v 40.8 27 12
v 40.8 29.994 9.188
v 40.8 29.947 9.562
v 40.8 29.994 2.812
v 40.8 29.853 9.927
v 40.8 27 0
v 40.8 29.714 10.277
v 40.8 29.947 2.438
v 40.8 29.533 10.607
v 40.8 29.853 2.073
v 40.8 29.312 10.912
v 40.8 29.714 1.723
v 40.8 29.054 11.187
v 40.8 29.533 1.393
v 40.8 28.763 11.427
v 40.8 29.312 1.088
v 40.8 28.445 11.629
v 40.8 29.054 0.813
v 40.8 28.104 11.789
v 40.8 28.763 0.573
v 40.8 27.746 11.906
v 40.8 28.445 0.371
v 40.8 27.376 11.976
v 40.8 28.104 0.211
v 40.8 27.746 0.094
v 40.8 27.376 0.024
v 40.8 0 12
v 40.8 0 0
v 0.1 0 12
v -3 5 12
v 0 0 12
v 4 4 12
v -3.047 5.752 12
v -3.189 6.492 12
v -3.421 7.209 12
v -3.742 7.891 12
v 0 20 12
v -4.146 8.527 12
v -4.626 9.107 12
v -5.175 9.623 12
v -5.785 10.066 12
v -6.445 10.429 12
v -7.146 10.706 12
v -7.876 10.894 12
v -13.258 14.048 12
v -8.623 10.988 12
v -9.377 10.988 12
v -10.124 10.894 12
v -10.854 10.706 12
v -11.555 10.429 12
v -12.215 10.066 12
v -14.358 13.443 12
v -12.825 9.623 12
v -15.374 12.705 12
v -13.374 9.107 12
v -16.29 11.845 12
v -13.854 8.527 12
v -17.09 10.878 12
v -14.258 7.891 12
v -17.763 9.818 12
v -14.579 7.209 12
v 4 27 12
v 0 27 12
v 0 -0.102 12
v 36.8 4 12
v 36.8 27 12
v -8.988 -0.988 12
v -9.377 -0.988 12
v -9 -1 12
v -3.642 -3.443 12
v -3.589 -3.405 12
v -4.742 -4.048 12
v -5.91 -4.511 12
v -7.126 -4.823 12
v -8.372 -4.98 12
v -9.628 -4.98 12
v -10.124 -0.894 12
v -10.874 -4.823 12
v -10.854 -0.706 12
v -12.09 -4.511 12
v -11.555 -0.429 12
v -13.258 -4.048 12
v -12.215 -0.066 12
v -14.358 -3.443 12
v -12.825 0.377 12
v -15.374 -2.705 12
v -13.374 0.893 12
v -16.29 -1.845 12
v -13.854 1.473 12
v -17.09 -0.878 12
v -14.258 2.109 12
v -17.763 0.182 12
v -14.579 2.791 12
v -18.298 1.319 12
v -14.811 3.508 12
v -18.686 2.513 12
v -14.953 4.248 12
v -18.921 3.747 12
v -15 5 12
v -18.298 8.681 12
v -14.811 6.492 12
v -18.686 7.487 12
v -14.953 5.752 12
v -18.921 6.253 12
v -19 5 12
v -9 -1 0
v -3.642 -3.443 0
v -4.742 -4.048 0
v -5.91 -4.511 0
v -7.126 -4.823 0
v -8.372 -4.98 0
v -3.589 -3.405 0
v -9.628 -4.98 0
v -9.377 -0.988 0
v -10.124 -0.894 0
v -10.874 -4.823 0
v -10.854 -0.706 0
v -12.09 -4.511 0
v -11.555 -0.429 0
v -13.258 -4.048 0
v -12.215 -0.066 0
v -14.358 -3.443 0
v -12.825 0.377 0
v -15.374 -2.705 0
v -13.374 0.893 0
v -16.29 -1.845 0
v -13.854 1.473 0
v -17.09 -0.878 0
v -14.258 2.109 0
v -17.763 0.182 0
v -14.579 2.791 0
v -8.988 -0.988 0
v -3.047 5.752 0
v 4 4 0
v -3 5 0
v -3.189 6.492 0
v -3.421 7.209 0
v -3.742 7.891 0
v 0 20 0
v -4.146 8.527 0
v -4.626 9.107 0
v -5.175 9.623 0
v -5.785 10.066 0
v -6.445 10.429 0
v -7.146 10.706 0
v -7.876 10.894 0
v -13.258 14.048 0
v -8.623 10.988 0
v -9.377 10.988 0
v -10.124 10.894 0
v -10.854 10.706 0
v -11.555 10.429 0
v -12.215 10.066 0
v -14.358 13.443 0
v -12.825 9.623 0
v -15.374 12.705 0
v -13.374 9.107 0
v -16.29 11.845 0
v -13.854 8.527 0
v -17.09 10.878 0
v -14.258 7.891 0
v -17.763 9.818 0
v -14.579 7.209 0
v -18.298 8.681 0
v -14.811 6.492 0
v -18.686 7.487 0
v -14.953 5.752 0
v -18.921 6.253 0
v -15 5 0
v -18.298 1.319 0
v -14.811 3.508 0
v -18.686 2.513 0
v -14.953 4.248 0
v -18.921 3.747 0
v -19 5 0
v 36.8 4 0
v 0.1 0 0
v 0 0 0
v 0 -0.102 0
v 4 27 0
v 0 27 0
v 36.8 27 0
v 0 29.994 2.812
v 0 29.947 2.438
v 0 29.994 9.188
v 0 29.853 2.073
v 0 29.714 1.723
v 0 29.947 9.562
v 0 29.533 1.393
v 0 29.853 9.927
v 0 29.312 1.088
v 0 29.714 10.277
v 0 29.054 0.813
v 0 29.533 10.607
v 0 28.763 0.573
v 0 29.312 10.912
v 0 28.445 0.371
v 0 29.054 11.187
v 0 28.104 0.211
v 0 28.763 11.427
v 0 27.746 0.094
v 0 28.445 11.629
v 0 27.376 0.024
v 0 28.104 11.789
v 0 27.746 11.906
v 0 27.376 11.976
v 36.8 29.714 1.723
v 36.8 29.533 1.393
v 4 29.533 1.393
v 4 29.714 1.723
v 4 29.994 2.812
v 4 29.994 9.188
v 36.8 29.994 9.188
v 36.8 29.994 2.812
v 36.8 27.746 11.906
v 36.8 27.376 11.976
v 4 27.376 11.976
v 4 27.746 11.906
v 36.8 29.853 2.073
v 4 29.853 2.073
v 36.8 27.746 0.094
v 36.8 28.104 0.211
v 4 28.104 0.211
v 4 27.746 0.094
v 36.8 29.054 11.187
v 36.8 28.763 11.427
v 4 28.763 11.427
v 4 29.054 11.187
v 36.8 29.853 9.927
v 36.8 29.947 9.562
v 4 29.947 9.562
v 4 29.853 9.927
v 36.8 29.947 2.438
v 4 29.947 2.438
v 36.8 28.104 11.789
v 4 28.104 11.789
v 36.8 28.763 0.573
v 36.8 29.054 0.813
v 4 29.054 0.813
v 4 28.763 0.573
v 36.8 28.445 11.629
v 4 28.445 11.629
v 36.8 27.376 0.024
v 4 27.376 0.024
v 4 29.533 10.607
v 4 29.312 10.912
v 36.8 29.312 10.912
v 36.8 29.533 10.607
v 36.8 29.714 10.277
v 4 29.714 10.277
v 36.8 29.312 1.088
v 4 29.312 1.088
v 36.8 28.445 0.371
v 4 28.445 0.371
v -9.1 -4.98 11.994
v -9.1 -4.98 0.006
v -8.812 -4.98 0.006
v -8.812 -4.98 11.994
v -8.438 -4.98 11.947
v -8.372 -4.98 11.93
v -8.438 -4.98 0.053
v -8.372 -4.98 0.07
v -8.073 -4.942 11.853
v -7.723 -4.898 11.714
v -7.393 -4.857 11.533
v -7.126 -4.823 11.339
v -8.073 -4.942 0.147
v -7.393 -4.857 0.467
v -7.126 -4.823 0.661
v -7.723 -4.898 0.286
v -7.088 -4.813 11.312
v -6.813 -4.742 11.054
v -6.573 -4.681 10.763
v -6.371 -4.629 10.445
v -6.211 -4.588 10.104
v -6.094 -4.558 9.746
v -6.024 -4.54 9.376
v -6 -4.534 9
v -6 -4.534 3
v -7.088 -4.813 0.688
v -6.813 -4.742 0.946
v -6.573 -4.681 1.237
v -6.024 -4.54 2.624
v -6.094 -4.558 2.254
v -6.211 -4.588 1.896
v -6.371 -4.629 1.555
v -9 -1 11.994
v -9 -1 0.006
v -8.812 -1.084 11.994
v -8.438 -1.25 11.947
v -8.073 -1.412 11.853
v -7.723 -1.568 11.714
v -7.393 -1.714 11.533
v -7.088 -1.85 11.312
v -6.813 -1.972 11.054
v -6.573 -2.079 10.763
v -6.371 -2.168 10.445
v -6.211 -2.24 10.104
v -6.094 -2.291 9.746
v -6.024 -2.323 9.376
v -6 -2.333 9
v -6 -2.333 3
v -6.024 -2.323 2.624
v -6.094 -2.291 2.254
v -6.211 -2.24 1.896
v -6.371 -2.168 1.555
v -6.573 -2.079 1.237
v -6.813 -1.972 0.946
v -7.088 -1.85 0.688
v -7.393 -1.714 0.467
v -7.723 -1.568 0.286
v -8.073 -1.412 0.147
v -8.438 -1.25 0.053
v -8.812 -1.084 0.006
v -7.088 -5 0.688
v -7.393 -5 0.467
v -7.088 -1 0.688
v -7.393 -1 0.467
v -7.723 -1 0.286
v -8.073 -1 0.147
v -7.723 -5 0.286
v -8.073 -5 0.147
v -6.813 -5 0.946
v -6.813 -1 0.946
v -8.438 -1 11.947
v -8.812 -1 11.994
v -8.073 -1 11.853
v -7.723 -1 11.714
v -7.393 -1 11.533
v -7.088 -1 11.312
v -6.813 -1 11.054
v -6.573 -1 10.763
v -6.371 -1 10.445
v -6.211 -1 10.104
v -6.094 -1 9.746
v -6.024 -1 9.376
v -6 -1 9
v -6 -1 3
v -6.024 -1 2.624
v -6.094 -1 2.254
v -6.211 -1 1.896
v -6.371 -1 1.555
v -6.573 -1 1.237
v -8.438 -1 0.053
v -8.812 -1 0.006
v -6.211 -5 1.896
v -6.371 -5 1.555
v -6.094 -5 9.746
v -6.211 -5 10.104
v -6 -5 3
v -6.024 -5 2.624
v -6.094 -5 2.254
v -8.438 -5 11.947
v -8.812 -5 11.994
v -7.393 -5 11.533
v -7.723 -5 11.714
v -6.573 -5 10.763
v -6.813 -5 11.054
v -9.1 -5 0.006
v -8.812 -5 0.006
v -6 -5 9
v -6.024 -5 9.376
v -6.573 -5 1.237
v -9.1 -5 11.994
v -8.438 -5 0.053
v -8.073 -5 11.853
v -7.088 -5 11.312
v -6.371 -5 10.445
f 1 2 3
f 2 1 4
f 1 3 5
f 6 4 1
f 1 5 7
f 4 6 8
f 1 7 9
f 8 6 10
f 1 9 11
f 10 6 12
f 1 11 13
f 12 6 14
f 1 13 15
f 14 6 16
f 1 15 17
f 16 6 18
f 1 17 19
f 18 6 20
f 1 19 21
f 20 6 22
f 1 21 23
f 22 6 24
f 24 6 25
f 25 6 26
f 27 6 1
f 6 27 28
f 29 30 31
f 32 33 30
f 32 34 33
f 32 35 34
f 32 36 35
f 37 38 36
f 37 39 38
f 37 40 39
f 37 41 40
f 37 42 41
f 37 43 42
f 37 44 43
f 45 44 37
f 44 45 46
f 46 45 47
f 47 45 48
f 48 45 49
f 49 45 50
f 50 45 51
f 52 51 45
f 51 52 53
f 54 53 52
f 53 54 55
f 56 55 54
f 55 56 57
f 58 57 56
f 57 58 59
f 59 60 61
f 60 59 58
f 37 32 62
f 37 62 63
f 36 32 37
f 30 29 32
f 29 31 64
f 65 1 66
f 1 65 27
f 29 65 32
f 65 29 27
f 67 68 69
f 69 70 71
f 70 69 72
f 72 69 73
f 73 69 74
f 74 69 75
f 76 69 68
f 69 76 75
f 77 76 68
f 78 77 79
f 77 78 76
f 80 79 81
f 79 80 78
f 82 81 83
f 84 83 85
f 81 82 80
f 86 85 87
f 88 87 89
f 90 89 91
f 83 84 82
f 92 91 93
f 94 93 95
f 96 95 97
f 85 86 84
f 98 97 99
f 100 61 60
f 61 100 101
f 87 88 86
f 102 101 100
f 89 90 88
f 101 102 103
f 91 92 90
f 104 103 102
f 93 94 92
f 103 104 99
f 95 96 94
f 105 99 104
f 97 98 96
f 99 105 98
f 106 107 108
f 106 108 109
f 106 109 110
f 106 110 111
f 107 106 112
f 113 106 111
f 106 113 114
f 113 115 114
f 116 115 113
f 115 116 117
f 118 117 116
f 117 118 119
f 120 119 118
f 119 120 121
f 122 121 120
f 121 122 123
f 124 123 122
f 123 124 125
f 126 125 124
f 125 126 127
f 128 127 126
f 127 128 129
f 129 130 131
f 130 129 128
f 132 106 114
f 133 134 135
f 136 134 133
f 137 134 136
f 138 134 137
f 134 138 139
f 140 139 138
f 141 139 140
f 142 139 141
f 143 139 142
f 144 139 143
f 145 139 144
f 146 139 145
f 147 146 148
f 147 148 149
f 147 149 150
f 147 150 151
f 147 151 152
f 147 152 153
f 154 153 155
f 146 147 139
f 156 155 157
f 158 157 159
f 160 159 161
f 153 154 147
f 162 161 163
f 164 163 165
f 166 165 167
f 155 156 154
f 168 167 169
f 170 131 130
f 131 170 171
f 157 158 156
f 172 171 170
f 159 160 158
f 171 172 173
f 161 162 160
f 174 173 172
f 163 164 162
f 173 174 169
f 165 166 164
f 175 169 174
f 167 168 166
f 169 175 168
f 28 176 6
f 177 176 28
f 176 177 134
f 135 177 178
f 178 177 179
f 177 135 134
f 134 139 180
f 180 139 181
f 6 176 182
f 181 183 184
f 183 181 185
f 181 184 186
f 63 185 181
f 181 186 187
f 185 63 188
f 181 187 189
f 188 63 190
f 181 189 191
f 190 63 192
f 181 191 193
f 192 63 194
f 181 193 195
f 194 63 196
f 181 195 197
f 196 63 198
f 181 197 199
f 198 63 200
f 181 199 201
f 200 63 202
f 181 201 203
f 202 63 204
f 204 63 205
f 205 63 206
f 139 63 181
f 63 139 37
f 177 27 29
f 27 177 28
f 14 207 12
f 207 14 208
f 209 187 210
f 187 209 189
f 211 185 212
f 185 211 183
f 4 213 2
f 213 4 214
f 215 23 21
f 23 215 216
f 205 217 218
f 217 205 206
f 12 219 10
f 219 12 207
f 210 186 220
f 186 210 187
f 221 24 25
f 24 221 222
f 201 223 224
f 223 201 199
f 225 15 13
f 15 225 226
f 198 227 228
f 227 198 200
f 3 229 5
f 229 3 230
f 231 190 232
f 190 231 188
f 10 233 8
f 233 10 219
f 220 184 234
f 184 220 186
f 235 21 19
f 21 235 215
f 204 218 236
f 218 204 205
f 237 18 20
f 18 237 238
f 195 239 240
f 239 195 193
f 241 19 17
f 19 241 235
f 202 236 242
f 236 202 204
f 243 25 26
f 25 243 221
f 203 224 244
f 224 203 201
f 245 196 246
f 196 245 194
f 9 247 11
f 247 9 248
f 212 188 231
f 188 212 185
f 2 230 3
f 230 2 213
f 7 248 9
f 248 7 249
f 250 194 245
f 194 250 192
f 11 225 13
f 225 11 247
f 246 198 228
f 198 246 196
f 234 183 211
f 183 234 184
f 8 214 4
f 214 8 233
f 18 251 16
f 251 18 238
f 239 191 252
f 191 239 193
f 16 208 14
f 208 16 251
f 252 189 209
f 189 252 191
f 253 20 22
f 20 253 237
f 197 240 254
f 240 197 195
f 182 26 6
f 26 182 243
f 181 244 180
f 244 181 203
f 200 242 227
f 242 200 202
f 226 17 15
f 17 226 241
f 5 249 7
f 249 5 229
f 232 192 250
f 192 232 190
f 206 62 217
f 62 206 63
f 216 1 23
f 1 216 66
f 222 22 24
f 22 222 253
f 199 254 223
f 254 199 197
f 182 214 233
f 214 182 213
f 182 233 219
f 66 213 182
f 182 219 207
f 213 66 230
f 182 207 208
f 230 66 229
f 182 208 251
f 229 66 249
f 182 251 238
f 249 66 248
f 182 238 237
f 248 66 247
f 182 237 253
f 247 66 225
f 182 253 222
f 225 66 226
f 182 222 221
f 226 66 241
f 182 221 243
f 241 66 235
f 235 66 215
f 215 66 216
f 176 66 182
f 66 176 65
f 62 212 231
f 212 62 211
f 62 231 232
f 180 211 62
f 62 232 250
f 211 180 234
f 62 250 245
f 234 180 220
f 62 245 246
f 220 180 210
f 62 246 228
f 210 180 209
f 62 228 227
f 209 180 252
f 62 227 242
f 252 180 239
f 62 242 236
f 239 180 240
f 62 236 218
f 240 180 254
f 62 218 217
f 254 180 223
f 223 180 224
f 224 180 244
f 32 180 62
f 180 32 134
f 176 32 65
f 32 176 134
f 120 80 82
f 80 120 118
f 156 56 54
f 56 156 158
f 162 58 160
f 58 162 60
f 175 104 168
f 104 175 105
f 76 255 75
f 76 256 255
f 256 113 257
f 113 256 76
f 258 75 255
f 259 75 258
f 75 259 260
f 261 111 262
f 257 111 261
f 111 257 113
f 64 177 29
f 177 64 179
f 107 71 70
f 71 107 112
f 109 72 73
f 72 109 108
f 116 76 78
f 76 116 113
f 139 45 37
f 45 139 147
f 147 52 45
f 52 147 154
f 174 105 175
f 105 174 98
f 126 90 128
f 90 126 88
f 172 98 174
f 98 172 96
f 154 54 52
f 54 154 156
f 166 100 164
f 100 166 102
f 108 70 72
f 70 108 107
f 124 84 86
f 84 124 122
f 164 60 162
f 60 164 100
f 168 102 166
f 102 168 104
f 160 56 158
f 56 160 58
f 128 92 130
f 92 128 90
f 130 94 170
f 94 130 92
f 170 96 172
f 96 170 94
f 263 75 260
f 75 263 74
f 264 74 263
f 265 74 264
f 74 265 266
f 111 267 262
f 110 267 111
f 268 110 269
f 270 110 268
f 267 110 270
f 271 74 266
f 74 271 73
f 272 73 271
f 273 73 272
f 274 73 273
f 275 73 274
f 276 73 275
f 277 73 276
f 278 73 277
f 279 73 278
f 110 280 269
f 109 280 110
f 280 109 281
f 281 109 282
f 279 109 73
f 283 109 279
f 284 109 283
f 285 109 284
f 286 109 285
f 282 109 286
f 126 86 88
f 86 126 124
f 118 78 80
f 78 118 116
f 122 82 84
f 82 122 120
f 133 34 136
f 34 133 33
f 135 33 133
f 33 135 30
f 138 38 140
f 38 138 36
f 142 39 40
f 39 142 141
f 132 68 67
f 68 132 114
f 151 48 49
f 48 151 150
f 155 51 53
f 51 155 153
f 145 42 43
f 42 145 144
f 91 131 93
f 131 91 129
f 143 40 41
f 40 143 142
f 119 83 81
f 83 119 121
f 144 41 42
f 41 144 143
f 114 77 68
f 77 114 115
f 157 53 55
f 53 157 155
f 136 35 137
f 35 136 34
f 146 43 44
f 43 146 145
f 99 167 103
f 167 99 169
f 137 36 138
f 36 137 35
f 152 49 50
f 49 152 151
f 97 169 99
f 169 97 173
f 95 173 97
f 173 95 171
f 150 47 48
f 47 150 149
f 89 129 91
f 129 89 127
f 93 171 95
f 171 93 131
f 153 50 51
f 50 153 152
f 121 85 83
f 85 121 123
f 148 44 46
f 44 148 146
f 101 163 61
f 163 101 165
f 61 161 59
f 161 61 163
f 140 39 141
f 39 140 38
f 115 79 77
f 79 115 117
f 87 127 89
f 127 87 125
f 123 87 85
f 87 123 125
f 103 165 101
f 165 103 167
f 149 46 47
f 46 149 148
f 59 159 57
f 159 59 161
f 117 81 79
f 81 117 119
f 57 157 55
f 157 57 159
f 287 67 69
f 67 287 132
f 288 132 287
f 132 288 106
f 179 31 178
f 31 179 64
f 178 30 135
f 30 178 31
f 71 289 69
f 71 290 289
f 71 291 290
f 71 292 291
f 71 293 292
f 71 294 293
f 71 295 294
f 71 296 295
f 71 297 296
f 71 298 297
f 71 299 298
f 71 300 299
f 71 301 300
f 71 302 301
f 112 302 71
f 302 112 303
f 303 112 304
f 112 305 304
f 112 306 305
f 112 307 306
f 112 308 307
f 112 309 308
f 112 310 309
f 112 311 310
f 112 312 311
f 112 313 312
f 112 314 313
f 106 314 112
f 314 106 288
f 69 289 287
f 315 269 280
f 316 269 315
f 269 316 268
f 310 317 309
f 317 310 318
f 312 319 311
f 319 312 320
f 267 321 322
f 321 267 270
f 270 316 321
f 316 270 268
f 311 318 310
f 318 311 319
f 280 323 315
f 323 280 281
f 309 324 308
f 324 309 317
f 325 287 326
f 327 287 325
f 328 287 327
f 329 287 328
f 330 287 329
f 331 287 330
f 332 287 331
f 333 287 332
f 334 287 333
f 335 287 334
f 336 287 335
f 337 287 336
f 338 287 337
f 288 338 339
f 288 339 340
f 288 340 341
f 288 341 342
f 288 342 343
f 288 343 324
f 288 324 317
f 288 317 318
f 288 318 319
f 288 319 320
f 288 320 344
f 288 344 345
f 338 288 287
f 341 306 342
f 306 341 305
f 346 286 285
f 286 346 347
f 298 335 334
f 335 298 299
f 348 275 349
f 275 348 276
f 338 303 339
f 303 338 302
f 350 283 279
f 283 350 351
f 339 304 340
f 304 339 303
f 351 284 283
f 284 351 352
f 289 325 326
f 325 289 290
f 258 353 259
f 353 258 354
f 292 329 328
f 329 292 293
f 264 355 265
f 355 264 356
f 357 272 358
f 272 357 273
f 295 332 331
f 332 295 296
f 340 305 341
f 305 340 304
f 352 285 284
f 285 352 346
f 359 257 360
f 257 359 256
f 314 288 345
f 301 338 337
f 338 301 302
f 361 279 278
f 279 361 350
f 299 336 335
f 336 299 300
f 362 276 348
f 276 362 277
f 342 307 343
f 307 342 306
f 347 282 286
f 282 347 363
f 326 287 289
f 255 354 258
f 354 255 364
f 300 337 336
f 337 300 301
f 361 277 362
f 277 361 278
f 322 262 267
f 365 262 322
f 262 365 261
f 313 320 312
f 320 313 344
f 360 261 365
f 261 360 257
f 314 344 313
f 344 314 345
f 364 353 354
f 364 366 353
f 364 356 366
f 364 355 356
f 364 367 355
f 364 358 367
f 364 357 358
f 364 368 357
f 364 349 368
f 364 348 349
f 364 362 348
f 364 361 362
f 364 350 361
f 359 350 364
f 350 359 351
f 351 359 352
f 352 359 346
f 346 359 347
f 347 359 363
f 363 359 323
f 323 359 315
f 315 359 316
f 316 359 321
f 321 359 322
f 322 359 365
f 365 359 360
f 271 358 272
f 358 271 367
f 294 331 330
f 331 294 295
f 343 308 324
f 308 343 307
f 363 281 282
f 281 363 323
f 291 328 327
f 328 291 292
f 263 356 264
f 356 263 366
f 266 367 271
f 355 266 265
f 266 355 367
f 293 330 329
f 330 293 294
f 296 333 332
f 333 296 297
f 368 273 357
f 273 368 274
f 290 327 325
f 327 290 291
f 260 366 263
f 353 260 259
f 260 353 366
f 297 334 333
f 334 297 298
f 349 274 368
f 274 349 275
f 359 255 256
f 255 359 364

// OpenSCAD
$fn = 50*1;
//Desk thikness
desk_thikness = 32.8;
//Clip width
clip_width = 12;


difference(){
	union(){	
		cube([desk_thikness+8,27,clip_width]);
		hull(){
			translate([0,27,3]) rotate ([0,90,0]) cylinder(desk_thikness+8,r=3);
			translate([0,27,clip_width-3]) rotate ([0,90,0]) cylinder(desk_thikness+8,r=3);
		}	
	}
		translate([4,4,0]) cube([desk_thikness,27,clip_width]);
}

difference() { 
	hull(){
			cube([0.1,20,clip_width]);
			translate([-9,5,clip_width/2]) cylinder(clip_width,r = 10,center = true);
		}
	translate([-9,5,0]) cylinder(clip_width,r = 6);
	linear_extrude(clip_width){
		translate([-9,5,0]) polygon([[9,-5],[6, 0],[0, -6],[0, -10],[0, -6],[9, -10]]);}

	
}
difference(){
	hull(){
		translate([-9,-1,clip_width-3]) rotate ([90,0,0]) cylinder(4,r=3);
		translate([-9,-1,3]) rotate ([90,0,0]) cylinder(4,r=3);
	}
	translate([-12,-1,0]) rotate ([90,0,0]) cube([2.9,clip_width,5]);
}
